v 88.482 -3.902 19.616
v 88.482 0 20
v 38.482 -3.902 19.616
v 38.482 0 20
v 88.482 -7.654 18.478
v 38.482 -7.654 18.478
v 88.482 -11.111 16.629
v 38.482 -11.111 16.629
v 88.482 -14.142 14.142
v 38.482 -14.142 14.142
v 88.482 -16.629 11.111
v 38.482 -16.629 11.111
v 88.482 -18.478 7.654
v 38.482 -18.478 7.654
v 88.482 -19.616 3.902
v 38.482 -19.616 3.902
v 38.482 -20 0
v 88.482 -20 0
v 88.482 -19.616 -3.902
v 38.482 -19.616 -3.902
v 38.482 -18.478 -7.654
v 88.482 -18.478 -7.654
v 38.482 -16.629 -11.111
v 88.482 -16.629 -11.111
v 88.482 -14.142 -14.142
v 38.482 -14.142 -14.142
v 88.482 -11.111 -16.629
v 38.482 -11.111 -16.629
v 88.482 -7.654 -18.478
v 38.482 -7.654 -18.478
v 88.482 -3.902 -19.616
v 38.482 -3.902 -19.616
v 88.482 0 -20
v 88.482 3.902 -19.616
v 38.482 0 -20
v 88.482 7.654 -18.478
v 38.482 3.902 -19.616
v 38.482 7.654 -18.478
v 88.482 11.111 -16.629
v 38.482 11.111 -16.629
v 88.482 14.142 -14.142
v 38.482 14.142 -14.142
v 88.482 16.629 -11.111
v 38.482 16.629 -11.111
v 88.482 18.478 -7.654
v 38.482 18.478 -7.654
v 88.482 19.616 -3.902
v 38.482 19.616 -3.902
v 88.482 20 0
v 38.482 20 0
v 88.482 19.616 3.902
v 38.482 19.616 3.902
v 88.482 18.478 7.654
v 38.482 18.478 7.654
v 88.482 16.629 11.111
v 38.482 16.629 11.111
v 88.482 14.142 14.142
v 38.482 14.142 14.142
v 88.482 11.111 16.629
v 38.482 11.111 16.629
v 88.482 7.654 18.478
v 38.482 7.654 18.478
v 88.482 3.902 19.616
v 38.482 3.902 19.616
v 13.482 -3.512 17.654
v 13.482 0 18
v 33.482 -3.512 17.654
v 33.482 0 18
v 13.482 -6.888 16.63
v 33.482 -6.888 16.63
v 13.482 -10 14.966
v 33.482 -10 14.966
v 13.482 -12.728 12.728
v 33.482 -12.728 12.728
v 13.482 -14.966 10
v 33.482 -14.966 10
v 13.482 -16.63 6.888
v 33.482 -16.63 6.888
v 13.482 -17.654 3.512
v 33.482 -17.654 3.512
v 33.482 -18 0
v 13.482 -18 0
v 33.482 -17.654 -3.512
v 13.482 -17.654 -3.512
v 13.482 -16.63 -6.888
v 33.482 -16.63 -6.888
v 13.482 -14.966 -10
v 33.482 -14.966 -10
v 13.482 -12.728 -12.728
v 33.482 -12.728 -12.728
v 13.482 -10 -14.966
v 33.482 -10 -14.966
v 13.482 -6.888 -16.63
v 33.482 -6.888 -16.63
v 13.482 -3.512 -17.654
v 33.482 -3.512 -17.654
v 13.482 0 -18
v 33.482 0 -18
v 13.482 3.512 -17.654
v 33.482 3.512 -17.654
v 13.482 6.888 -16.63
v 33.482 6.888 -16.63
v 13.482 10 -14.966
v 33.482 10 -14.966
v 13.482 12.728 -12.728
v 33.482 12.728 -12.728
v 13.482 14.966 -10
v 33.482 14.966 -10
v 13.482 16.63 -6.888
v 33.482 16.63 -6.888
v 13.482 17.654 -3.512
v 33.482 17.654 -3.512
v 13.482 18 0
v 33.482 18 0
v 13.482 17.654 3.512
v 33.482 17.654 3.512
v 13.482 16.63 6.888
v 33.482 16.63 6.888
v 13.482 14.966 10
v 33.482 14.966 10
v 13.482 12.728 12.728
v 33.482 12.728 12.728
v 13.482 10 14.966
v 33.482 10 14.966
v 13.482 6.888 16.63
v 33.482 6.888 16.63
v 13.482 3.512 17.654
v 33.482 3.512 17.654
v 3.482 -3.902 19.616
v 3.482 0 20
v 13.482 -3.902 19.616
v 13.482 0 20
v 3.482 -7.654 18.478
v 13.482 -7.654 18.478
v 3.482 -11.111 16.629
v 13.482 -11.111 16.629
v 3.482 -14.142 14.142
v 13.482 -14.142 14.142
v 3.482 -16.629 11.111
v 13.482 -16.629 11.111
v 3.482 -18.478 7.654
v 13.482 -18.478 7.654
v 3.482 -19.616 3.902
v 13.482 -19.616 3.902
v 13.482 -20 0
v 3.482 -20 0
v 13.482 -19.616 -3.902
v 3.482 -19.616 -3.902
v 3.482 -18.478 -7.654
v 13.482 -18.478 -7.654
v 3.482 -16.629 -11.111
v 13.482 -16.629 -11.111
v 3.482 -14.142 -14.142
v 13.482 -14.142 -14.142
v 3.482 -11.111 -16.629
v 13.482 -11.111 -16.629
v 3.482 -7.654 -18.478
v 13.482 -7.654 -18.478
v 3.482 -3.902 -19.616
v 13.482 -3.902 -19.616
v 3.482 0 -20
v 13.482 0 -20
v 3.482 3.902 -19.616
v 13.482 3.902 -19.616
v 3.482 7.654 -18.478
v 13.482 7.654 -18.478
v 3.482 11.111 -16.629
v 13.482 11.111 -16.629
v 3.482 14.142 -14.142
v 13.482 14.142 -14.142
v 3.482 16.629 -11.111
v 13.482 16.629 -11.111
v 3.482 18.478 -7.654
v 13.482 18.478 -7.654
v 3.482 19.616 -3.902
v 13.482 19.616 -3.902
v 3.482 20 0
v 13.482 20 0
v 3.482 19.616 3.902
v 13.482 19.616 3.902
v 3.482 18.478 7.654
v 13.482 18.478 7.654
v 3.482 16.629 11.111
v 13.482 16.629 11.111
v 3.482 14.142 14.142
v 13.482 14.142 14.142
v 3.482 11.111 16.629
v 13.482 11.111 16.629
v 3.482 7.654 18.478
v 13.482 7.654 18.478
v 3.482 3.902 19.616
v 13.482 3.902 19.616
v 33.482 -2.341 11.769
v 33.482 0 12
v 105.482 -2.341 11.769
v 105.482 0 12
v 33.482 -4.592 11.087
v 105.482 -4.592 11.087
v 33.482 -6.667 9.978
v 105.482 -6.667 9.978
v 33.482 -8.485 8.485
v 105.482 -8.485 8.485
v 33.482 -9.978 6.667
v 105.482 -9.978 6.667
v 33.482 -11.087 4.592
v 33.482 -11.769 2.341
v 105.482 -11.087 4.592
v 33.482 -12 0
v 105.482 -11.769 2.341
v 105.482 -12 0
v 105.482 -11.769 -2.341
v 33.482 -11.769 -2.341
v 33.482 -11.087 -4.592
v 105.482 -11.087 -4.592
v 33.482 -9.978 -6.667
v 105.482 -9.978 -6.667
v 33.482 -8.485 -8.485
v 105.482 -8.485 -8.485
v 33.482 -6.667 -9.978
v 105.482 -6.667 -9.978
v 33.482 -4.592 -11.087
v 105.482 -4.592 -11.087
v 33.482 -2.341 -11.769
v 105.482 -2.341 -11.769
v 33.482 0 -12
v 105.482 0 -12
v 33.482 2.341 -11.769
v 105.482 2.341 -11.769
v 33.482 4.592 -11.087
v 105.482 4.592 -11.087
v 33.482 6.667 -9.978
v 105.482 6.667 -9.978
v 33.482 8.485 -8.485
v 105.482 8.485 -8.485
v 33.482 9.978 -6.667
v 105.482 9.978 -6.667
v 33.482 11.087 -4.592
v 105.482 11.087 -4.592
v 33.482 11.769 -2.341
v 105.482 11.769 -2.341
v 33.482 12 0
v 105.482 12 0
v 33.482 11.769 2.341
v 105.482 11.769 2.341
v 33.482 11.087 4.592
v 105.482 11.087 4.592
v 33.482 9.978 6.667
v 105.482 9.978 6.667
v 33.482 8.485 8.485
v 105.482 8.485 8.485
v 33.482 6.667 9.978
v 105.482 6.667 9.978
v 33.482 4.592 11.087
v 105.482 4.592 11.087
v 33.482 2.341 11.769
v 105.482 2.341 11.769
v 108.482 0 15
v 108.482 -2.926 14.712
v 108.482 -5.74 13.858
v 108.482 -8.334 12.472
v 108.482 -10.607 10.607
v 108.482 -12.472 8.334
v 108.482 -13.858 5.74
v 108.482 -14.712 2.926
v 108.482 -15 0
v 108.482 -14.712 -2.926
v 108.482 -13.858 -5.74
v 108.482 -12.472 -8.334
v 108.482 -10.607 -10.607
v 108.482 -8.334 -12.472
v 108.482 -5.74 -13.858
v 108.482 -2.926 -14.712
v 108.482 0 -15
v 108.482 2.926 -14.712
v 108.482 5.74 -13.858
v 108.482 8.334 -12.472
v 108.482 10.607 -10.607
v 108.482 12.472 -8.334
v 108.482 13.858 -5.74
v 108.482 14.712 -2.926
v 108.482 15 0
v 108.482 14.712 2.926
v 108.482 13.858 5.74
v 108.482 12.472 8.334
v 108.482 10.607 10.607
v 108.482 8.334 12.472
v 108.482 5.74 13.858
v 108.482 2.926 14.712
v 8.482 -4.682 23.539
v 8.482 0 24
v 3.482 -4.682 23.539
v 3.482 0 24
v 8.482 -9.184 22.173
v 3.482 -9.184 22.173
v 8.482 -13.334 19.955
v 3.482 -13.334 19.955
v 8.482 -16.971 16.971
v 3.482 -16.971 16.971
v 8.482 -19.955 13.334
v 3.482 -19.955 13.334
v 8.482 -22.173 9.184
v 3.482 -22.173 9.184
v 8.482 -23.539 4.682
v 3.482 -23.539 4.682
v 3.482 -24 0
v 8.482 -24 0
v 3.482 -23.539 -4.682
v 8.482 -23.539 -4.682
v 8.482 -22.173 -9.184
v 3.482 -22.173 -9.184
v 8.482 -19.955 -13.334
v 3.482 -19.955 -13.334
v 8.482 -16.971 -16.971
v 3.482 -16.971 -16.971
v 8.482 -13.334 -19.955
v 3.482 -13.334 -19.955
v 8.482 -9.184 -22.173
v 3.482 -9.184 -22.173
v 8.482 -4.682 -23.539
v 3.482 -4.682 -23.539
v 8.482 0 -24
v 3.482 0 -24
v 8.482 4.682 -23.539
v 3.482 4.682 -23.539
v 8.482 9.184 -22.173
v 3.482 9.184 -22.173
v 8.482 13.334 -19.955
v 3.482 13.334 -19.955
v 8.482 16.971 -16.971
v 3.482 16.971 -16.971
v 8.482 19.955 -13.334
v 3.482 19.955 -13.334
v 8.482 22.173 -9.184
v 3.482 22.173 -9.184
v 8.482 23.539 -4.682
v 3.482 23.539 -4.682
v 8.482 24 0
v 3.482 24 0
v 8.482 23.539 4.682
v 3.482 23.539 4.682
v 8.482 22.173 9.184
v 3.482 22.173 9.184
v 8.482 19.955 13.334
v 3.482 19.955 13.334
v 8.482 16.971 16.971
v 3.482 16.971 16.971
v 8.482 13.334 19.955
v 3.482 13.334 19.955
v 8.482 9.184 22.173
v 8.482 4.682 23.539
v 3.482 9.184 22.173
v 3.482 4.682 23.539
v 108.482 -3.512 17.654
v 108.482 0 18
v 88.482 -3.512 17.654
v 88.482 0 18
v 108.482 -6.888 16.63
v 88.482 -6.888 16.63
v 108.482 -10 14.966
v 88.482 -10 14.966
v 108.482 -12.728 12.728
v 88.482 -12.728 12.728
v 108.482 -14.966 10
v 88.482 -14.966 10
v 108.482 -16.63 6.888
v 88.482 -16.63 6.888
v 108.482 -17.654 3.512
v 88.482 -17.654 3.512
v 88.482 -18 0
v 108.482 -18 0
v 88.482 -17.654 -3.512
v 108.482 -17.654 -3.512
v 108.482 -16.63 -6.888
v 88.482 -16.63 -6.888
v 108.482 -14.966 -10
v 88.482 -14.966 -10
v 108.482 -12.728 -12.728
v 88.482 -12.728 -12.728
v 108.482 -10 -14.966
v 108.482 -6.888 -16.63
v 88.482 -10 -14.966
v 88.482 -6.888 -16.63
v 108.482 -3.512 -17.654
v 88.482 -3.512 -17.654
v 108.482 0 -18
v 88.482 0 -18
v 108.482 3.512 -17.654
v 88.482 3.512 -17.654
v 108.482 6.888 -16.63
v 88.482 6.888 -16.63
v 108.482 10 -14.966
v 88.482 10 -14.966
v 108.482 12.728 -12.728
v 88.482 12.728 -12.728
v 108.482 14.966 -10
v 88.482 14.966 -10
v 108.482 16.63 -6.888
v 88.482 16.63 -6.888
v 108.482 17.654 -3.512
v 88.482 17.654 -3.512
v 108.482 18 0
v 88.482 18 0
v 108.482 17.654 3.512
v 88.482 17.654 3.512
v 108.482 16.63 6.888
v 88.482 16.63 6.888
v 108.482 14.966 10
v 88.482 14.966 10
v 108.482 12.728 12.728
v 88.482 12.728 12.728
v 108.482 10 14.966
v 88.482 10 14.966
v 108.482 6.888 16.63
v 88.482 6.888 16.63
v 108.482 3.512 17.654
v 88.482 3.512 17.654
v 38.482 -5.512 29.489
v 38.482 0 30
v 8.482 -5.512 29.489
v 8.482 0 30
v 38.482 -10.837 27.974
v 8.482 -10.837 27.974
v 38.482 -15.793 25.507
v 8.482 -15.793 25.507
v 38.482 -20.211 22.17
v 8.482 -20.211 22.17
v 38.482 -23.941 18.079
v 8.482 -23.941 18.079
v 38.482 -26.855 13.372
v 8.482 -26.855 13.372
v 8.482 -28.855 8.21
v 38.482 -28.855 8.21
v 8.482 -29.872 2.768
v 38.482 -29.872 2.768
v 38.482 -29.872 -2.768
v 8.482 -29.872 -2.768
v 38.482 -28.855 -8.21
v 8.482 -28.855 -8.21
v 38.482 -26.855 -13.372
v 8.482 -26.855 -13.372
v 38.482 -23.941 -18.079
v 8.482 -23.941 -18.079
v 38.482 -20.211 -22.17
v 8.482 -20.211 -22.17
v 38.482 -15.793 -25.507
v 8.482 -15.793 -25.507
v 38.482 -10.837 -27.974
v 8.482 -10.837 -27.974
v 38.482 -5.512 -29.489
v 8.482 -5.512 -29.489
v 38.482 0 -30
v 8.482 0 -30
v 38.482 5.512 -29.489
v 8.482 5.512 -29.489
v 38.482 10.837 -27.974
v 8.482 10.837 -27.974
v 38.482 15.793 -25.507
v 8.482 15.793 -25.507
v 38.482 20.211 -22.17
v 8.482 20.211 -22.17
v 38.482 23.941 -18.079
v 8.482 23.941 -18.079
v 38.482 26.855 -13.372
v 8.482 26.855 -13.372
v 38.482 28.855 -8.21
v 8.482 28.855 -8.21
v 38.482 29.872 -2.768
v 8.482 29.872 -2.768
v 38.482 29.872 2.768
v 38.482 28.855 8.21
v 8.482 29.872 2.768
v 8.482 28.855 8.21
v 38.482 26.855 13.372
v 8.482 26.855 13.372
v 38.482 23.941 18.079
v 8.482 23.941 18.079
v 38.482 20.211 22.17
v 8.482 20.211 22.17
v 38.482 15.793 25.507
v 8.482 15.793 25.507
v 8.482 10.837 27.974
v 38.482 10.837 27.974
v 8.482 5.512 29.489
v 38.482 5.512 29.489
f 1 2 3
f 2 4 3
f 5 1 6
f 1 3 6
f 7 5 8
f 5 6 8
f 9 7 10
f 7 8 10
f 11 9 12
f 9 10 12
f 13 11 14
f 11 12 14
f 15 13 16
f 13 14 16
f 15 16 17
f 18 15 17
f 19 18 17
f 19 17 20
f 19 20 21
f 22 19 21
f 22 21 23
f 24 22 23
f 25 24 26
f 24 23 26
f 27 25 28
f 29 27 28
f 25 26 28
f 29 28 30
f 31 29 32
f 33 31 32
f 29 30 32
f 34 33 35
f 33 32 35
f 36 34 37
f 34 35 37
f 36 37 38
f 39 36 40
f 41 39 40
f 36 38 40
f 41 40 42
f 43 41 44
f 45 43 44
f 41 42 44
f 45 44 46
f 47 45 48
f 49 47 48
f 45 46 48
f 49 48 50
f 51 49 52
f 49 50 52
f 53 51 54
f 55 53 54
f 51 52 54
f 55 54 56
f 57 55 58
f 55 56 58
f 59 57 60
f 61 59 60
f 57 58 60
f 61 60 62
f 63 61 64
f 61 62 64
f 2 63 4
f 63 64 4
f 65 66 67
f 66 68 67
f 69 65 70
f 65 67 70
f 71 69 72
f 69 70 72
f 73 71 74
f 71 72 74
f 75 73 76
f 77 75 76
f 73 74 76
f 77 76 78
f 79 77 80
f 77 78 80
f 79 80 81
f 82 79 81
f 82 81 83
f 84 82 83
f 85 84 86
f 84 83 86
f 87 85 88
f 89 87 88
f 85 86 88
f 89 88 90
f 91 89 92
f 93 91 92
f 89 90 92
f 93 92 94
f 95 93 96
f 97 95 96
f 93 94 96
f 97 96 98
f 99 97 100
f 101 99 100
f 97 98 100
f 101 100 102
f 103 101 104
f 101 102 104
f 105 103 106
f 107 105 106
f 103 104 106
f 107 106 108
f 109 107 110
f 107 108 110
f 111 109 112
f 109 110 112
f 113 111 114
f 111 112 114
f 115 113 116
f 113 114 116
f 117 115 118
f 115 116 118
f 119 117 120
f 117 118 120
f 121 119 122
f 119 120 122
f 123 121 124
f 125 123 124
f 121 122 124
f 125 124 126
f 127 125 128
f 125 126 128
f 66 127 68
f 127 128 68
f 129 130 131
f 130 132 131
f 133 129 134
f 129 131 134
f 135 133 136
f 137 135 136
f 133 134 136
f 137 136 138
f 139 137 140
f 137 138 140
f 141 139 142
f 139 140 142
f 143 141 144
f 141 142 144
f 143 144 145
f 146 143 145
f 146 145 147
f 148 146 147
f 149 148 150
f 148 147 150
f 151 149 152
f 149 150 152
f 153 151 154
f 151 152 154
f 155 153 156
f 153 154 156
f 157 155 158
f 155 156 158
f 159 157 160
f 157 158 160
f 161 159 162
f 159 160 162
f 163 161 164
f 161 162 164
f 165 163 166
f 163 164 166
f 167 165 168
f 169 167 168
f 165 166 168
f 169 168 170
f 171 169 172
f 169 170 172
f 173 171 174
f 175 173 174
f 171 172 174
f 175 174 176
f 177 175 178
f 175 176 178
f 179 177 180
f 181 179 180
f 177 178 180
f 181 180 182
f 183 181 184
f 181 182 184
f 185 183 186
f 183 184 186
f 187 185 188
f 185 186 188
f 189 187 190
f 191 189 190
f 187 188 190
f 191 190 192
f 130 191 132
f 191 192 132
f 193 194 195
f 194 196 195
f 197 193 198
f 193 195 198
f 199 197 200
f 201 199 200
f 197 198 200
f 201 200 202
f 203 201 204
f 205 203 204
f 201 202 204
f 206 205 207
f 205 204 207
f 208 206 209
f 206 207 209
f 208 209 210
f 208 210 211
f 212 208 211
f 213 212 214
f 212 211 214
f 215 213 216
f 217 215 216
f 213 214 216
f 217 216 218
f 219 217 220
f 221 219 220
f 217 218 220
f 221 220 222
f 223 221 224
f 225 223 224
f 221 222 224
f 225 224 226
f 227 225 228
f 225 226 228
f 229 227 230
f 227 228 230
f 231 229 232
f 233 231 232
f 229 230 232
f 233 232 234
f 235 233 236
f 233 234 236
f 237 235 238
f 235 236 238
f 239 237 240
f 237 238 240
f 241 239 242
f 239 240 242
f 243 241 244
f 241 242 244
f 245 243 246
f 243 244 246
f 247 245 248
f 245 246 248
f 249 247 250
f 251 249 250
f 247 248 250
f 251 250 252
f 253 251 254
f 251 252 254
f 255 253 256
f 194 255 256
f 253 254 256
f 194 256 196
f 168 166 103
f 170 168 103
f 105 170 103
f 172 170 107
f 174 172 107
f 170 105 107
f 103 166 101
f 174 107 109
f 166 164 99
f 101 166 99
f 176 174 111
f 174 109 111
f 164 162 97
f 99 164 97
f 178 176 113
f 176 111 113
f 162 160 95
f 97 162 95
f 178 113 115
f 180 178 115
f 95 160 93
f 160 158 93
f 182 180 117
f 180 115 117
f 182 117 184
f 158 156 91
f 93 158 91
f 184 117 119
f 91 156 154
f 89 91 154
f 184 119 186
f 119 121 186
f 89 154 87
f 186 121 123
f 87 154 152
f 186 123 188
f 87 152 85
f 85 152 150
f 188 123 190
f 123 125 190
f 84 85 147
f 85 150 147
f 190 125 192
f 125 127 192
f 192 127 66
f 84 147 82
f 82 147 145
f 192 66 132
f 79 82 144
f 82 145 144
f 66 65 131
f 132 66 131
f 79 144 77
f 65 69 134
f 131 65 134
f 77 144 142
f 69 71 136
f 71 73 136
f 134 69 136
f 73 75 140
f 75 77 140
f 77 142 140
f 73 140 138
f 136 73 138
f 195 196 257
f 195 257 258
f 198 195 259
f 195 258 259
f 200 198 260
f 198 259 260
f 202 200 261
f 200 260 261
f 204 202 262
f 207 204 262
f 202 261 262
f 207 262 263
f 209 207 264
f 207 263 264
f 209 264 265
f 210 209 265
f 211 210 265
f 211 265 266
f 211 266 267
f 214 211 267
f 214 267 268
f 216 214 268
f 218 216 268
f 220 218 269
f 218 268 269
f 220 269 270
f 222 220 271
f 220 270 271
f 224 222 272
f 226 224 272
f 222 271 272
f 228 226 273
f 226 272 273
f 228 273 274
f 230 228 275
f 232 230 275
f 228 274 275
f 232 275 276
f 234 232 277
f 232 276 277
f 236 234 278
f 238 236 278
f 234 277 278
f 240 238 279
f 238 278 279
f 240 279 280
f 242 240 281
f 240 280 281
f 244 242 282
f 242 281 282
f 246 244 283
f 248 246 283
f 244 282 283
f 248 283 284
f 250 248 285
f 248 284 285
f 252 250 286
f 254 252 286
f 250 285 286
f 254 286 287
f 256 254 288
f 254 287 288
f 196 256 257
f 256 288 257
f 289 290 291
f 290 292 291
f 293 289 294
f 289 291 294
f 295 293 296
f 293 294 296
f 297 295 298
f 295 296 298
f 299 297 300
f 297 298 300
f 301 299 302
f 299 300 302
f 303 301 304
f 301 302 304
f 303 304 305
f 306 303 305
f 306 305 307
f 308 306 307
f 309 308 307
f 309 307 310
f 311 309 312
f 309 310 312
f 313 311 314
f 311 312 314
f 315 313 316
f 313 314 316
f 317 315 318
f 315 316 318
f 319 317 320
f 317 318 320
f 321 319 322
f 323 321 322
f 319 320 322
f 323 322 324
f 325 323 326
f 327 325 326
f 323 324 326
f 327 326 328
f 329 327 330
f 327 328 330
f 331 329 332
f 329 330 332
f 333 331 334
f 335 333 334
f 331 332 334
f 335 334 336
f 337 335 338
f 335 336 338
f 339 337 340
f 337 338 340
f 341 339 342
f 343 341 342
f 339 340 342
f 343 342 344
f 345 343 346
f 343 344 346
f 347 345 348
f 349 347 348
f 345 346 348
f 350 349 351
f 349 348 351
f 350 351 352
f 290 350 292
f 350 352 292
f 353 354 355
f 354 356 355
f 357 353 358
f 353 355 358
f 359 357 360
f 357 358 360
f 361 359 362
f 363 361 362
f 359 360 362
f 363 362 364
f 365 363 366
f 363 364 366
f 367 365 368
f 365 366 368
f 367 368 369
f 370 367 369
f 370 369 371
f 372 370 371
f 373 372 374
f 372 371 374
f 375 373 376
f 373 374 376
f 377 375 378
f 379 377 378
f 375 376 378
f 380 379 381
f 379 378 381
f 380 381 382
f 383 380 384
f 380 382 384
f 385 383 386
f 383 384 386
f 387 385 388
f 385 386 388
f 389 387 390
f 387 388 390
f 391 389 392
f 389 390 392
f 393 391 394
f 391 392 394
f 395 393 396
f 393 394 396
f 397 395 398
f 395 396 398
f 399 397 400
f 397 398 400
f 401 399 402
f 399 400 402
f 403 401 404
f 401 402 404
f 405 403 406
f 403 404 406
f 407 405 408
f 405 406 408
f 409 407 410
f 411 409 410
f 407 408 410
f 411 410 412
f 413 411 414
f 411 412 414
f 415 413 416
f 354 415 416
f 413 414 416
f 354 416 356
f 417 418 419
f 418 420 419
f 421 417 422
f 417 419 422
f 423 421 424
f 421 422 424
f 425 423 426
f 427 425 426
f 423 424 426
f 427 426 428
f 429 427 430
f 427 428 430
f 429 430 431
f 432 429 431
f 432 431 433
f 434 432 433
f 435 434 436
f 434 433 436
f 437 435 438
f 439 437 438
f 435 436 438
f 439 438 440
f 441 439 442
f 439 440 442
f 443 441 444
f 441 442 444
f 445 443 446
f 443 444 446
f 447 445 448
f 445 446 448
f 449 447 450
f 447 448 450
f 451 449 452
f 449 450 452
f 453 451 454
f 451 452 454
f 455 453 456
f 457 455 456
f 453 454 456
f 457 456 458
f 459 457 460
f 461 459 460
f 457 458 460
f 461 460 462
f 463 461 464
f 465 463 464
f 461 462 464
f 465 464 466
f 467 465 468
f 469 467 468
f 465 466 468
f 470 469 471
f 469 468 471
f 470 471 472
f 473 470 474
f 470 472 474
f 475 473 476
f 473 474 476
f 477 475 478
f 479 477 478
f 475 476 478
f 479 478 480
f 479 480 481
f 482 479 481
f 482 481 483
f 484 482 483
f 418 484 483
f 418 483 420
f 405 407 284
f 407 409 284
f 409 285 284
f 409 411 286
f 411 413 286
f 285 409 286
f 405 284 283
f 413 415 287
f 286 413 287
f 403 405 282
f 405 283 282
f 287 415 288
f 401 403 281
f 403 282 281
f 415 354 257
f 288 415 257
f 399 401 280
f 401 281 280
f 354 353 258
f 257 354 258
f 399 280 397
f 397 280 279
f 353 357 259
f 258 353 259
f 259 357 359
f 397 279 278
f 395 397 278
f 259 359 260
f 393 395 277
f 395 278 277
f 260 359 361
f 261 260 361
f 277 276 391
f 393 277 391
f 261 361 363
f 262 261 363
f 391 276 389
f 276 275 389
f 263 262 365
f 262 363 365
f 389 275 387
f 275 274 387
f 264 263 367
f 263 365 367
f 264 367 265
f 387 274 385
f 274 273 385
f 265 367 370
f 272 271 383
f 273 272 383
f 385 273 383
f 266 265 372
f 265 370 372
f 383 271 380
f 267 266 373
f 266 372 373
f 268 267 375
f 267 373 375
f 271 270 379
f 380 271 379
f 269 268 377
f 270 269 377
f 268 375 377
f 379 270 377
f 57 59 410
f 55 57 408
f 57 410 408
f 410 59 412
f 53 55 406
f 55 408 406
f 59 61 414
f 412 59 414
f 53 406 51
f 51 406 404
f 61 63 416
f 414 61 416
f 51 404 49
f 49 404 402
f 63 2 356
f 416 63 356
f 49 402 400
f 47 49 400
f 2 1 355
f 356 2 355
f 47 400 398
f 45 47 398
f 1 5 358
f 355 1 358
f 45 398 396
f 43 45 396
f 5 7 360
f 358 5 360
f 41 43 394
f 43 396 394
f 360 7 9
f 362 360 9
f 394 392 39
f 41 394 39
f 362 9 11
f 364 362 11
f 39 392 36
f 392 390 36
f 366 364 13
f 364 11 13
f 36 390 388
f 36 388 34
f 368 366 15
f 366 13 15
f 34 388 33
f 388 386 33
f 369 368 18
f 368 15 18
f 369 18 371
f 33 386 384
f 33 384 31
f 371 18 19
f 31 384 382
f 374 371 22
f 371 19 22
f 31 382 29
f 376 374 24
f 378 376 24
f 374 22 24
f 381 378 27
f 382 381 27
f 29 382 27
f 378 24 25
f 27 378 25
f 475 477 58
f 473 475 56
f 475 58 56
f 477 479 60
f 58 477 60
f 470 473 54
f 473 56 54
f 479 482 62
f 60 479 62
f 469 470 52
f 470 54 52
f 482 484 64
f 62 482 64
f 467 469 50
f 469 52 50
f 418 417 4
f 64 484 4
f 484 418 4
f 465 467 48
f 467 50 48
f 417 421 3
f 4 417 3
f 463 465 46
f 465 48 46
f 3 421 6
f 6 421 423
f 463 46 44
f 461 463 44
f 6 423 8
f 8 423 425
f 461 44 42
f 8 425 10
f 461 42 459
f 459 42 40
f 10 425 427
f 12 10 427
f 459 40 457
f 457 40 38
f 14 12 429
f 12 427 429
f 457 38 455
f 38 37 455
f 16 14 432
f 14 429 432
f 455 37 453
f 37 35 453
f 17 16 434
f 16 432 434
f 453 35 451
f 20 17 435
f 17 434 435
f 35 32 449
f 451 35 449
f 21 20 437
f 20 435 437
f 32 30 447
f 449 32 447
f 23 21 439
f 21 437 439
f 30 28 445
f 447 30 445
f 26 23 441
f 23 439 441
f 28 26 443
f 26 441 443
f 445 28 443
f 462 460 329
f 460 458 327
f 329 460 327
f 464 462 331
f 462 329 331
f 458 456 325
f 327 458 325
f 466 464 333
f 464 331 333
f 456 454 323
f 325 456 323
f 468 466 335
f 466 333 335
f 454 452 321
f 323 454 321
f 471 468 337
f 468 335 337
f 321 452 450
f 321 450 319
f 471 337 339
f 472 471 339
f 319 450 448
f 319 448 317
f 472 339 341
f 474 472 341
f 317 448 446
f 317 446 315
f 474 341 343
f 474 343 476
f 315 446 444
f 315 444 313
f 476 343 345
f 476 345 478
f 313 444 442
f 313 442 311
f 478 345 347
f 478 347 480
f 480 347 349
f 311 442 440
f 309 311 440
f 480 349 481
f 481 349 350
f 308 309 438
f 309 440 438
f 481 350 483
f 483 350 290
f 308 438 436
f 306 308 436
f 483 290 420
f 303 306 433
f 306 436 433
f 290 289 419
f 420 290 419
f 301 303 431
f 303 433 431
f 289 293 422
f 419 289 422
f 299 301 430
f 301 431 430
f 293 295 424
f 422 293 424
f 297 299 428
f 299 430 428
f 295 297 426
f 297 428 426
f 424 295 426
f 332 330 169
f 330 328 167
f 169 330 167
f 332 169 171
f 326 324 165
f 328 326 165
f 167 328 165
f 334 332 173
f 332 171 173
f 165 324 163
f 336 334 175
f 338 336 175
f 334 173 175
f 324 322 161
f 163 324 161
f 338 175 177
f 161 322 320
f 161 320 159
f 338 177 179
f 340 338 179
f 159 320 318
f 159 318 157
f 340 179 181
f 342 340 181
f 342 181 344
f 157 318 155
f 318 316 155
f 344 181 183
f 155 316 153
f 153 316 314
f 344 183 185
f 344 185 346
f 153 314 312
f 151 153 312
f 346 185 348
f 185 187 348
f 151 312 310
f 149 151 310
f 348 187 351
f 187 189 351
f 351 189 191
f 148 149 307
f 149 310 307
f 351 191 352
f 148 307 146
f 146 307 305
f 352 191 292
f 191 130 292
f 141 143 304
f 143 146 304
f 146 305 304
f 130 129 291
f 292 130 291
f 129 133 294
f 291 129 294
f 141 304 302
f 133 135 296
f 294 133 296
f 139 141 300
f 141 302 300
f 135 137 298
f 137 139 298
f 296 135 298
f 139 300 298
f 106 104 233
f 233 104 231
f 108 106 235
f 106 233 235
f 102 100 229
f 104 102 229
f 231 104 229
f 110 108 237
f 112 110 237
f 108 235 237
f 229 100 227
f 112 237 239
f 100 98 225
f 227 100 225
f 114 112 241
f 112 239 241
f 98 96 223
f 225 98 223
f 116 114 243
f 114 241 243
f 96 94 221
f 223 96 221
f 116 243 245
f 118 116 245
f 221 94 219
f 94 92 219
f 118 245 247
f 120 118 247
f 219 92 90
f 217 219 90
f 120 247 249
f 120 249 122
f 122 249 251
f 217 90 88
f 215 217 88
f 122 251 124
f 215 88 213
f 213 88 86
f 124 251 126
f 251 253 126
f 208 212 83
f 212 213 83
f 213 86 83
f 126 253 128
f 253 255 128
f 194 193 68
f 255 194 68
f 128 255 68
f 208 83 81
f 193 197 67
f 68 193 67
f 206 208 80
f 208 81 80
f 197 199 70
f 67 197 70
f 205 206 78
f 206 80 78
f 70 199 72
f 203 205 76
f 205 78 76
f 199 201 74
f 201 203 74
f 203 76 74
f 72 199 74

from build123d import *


with BuildPart() as part:
    # Skizze1 → Rotation1 (revolve)
    with BuildSketch(Plane.XY, mode=Mode.PRIVATE) as rotation1_sk:
        Polygon((3.482134942, -20), (13.482134942, -20), (13.482134942, -18), (33.482134942, -18), (33.482134942, -12), (105.482134942, -12), (108.482134942, -15), (108.482134942, -18), (88.482134942, -18), (88.482134942, -20), (38.482134942, -20), (38.482134942, -30), (8.482134942, -30), (8.482134942, -24), (3.482134942, -24), align=None)
    revolve(rotation1_sk.sketch.rotate(Axis((0, 0, 0), (1, 0, 0)), 270), axis=Axis((0, 0, 0), (1, 0, 0)))


solid = part.part
